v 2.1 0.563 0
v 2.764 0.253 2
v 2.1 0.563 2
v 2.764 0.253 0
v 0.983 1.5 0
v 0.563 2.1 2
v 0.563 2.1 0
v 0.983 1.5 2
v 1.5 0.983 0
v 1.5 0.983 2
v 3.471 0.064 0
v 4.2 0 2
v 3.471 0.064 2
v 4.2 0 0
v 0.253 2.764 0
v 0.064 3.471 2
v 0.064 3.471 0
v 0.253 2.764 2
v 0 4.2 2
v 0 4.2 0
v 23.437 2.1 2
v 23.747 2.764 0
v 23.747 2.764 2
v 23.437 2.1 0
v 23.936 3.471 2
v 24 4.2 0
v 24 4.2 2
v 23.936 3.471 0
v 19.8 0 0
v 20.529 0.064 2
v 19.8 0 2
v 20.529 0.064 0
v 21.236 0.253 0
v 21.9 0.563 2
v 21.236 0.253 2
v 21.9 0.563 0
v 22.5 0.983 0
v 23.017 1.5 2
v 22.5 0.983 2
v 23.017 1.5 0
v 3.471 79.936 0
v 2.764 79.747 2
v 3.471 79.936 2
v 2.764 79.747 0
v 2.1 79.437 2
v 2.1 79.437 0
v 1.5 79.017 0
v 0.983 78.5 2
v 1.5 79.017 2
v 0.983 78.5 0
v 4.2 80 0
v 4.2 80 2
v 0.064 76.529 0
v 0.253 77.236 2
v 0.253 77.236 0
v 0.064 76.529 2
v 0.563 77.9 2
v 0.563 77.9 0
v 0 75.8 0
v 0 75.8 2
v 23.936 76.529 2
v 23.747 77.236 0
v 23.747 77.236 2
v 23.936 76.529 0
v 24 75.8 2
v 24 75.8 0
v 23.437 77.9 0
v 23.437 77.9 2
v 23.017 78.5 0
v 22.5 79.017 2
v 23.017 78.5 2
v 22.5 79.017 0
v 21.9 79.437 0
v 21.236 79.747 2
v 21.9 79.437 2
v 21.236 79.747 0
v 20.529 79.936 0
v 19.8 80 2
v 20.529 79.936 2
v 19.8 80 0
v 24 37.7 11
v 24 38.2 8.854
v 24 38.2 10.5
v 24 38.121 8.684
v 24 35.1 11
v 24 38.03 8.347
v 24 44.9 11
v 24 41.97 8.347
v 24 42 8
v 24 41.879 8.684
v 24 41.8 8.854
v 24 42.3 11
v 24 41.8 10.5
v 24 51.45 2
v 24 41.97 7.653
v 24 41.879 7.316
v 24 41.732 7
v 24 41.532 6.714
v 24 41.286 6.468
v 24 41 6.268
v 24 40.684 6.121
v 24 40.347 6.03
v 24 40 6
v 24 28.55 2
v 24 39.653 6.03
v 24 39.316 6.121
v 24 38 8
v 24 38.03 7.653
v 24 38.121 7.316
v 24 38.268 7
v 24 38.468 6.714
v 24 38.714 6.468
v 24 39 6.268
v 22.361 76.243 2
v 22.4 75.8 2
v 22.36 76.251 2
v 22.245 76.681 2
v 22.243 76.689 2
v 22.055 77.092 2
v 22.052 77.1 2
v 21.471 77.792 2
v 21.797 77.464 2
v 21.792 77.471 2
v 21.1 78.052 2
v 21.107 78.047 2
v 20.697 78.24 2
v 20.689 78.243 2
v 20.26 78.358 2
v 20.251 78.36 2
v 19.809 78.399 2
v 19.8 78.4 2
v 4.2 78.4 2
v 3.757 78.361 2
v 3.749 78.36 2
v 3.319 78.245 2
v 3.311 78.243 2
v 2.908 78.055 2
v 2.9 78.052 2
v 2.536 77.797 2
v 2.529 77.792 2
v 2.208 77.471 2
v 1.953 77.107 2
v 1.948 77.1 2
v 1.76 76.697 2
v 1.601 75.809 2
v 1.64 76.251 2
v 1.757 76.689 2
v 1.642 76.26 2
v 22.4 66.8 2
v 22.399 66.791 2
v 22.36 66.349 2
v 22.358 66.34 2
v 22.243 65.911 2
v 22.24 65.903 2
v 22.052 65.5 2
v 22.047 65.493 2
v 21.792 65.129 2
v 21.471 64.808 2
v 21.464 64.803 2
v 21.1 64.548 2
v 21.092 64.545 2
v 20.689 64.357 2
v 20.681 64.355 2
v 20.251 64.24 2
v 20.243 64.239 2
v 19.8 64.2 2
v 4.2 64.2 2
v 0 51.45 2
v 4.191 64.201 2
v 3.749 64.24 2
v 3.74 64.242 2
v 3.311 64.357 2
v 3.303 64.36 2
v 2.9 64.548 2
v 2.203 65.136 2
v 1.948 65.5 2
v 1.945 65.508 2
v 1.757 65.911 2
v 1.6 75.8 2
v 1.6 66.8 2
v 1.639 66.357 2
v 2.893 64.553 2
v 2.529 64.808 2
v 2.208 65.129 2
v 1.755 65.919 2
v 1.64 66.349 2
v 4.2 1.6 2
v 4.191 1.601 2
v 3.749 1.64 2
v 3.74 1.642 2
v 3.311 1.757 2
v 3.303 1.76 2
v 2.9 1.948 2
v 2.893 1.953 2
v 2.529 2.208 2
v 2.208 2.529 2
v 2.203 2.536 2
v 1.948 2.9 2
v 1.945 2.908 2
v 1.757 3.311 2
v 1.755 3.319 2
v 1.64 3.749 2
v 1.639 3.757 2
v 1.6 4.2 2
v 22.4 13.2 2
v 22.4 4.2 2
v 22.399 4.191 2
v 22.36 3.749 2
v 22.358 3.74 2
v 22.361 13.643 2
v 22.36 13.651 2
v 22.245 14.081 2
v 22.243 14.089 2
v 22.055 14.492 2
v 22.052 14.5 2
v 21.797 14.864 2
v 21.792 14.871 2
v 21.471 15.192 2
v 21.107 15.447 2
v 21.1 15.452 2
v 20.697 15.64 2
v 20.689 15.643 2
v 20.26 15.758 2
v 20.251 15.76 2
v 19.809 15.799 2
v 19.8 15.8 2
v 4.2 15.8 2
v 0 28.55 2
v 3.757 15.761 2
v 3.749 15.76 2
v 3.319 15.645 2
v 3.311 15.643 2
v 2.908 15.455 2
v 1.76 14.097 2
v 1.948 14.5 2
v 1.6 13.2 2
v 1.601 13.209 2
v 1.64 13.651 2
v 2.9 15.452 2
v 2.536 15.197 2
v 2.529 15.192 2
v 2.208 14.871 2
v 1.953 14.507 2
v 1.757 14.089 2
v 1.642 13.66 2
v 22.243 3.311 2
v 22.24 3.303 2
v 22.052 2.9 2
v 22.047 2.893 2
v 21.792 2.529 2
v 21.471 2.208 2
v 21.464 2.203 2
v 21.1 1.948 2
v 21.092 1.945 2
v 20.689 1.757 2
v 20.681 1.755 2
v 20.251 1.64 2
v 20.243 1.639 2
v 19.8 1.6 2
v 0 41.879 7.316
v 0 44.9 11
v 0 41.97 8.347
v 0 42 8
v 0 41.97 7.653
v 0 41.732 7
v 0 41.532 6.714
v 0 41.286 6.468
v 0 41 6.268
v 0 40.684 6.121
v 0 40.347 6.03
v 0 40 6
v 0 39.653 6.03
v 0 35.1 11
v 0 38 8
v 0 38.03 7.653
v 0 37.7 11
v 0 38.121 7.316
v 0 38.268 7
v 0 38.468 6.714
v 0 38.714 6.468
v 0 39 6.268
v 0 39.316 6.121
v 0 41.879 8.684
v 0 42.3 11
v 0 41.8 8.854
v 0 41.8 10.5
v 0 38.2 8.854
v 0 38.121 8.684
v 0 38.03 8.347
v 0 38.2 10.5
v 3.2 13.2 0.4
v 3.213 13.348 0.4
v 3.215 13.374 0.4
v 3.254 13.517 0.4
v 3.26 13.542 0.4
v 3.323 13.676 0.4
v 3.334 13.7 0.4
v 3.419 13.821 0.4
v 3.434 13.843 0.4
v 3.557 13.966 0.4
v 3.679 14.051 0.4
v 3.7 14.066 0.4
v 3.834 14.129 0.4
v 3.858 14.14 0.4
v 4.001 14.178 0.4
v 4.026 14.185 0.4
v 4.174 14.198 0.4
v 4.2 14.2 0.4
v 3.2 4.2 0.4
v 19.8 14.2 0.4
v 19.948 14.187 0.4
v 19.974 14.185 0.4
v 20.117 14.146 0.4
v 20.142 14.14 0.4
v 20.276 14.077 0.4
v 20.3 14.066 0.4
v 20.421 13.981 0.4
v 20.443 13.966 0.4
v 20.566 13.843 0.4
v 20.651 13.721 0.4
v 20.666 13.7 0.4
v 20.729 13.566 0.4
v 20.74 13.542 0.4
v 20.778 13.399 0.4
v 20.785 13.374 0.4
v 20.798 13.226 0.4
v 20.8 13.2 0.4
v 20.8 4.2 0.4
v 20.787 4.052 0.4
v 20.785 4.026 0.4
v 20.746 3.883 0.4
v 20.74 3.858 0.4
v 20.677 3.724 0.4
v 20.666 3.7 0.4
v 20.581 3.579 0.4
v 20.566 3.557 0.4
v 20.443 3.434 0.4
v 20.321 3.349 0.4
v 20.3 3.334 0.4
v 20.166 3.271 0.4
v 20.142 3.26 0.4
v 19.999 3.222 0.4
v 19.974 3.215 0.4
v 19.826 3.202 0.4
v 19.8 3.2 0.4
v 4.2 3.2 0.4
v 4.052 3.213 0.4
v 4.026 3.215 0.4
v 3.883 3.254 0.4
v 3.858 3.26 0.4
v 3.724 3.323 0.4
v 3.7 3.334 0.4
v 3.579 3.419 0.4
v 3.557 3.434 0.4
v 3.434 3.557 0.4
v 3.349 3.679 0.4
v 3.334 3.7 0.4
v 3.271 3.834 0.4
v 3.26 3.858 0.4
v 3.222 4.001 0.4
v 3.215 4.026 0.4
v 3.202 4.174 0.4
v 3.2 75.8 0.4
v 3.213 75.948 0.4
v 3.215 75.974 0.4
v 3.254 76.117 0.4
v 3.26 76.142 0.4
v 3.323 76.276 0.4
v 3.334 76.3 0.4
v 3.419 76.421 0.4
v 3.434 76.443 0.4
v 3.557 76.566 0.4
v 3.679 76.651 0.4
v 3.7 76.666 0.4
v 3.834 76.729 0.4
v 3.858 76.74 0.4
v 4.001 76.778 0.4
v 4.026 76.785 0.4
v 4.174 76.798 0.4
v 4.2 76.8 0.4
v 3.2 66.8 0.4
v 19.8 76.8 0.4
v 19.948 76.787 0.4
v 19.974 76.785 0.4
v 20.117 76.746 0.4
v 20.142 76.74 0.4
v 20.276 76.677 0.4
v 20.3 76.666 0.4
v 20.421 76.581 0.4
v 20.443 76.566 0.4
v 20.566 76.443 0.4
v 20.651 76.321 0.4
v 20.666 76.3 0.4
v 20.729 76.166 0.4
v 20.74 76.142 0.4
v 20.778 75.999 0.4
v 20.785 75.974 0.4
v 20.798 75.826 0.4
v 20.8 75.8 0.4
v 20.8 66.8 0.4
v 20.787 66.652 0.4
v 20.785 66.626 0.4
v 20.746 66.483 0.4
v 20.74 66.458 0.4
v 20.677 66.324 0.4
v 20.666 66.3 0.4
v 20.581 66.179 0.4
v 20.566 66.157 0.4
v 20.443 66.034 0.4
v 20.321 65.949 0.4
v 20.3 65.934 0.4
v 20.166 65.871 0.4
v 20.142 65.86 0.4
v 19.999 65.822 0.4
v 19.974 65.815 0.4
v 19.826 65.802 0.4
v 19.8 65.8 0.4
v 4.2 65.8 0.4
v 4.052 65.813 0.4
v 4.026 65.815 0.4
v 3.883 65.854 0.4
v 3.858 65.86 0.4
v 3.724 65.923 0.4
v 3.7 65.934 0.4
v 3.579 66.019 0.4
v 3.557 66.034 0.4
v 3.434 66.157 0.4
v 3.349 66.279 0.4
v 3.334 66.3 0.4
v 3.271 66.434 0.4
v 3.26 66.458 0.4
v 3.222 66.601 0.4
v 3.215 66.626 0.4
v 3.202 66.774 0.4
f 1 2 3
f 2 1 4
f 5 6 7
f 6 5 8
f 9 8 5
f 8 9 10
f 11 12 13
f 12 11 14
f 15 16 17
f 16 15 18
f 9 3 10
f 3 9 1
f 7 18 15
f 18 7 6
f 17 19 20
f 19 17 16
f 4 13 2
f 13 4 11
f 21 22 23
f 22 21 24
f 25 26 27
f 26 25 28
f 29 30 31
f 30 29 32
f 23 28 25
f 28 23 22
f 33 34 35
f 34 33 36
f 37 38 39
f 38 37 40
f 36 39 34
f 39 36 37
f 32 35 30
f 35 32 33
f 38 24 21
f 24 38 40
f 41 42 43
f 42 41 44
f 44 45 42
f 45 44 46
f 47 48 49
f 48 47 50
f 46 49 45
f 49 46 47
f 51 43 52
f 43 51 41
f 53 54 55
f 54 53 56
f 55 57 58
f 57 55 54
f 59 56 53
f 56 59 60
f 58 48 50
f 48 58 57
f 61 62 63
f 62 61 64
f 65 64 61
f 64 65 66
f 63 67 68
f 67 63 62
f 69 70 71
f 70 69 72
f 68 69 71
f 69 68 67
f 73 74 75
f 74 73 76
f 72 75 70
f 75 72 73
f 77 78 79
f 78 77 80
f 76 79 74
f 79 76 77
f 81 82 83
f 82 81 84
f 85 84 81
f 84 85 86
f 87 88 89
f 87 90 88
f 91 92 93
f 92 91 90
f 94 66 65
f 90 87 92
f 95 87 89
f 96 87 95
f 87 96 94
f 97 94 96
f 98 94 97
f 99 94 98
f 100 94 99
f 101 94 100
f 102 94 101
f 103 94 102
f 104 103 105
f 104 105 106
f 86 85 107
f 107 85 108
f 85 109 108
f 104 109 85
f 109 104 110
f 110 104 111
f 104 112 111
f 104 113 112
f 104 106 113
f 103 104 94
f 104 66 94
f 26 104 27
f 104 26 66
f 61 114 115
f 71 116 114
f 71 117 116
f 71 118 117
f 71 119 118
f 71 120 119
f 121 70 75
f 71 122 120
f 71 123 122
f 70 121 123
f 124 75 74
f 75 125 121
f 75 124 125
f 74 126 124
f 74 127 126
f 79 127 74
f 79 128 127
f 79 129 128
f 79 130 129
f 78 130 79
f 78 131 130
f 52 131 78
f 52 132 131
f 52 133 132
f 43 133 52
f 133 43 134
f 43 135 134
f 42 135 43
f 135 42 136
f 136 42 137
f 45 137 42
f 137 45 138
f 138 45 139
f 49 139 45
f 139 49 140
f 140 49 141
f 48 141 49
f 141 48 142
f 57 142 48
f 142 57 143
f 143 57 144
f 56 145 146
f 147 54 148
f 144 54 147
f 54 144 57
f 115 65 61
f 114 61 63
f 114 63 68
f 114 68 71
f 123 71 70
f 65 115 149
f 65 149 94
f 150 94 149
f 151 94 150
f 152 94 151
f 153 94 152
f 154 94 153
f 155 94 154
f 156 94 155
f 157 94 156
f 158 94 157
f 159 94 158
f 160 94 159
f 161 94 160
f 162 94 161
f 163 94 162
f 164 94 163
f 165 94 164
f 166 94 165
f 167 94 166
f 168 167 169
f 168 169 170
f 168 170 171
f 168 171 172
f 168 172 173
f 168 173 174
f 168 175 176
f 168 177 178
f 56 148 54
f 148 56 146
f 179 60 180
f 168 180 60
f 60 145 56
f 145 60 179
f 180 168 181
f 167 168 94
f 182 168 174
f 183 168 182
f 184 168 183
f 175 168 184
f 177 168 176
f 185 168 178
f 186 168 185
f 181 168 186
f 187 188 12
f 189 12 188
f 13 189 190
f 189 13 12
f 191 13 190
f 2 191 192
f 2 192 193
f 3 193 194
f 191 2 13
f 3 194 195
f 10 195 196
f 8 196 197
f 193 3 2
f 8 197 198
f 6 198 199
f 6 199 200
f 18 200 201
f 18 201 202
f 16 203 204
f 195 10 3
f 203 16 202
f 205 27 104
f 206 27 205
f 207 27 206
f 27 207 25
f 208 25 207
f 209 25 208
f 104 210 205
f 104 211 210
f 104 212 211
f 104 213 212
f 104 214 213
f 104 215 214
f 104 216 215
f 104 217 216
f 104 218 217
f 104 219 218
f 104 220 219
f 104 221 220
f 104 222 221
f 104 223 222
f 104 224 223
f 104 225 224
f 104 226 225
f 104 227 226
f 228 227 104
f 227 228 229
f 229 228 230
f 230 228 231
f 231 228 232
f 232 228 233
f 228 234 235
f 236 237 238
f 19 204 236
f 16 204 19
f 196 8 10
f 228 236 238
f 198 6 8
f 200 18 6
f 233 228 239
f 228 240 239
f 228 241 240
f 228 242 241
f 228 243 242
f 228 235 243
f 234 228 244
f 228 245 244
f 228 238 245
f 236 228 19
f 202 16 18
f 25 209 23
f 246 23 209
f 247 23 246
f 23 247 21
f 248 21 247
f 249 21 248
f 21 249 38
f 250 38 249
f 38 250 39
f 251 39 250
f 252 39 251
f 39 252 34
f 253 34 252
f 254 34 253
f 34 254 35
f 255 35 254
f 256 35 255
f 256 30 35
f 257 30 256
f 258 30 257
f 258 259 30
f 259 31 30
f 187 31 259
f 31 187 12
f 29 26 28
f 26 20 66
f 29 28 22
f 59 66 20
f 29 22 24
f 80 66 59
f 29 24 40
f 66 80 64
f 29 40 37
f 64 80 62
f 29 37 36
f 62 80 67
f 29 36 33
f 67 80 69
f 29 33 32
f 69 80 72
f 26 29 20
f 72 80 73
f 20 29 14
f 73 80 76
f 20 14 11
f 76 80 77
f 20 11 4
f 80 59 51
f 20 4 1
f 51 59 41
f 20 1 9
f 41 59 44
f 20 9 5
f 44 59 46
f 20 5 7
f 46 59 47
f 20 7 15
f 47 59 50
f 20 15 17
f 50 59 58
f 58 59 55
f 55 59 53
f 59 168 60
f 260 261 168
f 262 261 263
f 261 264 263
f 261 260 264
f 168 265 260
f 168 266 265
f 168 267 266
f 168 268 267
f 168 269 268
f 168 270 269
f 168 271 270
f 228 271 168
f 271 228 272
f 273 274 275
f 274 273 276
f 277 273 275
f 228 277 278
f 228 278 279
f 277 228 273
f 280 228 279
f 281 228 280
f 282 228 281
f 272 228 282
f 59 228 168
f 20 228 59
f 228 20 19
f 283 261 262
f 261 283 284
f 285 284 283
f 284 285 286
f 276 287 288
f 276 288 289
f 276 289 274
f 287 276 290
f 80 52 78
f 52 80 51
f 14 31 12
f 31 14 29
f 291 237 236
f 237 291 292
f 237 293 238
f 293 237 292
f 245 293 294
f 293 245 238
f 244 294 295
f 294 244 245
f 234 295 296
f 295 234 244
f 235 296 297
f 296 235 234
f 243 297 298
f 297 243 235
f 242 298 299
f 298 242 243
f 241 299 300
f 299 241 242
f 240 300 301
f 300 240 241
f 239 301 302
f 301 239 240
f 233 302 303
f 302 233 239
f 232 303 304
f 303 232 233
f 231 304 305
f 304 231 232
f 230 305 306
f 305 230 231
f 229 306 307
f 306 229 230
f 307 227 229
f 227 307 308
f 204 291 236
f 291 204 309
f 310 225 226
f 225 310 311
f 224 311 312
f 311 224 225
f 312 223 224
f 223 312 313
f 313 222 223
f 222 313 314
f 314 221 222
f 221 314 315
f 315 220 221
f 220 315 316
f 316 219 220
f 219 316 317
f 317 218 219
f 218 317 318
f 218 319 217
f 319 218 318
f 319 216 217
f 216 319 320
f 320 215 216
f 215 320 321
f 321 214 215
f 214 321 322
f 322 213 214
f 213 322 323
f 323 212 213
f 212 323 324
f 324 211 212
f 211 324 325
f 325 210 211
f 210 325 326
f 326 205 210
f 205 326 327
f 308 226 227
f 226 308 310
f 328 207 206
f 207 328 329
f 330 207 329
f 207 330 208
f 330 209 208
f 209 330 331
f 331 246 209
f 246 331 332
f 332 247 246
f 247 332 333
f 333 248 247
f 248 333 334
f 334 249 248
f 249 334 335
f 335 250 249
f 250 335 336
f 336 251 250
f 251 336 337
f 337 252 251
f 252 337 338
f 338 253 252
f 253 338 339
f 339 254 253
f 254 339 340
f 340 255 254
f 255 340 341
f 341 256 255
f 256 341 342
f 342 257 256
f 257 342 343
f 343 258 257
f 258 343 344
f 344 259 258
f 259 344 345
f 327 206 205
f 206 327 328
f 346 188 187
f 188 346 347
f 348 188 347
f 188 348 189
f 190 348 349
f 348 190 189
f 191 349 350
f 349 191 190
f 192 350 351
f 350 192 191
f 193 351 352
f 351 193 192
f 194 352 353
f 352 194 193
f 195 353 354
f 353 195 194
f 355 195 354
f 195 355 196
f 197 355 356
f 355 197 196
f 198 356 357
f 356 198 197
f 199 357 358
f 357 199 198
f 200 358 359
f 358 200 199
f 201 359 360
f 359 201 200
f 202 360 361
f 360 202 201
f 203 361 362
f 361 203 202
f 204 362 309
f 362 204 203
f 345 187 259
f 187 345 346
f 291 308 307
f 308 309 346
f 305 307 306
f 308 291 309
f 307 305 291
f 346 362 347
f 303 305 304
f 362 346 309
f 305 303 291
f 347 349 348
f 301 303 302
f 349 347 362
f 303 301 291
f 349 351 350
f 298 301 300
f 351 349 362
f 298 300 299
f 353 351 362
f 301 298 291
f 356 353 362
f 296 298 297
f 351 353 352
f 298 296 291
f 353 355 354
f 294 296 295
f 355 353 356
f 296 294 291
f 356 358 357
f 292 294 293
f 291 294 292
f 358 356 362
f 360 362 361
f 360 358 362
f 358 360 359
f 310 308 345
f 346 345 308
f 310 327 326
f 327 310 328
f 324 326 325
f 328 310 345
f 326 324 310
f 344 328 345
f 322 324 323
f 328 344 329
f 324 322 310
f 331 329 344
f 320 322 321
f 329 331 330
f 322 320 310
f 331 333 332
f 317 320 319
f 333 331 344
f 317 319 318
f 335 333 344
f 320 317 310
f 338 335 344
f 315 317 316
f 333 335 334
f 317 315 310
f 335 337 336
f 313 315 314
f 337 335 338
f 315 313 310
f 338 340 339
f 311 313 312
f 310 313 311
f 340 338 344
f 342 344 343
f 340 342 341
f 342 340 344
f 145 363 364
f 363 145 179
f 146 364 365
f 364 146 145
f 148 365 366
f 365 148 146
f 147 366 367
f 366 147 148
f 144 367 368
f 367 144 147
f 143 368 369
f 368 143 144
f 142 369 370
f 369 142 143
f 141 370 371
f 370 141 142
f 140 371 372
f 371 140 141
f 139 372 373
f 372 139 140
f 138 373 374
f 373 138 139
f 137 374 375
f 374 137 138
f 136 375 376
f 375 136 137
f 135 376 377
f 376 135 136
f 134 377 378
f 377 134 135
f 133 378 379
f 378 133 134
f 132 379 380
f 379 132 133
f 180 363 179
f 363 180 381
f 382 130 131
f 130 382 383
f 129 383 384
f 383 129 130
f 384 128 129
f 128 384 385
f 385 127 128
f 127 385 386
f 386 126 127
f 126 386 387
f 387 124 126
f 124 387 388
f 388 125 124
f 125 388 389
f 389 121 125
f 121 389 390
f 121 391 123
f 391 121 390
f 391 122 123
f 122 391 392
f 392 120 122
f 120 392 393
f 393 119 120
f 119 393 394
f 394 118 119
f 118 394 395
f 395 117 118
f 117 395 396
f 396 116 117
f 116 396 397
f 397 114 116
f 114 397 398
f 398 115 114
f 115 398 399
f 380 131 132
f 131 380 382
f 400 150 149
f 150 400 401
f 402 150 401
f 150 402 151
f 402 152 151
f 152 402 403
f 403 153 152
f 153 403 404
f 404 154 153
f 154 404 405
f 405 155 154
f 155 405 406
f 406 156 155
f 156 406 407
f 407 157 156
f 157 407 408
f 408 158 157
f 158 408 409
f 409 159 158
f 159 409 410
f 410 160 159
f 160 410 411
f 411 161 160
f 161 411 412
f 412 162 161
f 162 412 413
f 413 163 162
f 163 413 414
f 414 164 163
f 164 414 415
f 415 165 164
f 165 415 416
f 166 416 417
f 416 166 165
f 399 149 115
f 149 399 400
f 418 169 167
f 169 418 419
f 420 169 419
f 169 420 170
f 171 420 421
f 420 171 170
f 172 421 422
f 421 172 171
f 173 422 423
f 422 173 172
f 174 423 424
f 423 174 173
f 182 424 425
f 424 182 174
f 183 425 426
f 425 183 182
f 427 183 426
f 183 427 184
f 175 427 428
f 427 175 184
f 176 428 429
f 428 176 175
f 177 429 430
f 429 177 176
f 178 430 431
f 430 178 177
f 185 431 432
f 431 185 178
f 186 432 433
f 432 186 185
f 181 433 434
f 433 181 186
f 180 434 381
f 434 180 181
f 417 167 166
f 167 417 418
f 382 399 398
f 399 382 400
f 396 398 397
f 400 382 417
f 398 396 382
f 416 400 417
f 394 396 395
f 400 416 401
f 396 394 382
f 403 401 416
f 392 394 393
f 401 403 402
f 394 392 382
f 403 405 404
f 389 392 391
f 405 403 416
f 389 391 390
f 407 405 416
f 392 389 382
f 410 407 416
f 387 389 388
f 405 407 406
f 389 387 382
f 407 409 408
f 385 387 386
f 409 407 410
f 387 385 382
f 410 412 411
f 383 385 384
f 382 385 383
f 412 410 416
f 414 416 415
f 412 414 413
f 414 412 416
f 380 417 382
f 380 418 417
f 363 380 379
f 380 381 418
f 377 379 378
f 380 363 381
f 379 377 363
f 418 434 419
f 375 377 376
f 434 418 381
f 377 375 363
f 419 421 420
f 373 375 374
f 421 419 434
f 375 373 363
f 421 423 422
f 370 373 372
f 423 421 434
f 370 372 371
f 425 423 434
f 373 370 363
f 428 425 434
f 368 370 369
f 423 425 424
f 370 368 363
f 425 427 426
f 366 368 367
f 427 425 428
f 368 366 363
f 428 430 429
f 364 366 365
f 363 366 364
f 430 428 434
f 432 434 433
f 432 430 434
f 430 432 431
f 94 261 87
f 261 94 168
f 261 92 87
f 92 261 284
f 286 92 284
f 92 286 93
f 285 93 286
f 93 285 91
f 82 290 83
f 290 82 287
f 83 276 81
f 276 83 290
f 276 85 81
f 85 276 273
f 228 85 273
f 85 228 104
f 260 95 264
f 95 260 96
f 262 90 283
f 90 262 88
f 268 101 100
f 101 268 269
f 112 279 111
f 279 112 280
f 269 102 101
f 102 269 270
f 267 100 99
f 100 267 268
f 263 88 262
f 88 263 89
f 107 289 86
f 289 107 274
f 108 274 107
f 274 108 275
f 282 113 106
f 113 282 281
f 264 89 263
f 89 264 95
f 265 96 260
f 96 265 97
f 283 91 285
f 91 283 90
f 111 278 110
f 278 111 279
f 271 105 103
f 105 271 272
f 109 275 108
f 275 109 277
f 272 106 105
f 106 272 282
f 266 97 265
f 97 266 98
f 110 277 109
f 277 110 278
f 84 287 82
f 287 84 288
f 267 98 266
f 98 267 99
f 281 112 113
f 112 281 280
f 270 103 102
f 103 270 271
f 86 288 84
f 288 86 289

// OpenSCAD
// preview[view:east, tilt:top diagonal]

/*[Parameters]*/

wire_diameter = 3.8;	//[2.0:2.0mm,2.1:2.1mm,2.2:2.2mm,2.3:2.3mm,2.4:2.4mm,2.5:2.5mm,2.6:2.6mm,2.7:2.7mm,2.8:2.8mm,2.9:2.9mm,3.0:3.0mm,3.1:3.1mm,3.2:3.2mm,3.3:3.3mm,3.4:3.4mm,3.5:3.5mm,3.6:3.6mm,3.7:3.7mm,3.8:3.8mm,3.9:3.9mm,4.0:4.0mm,4.1:4.1mm,4.2:4.2mm,4.3:4.3mm,4.4:4.4mm,4.5:4.5mm,4.6:4.6mm,4.7:4.7mm,4.8:4.8mm,4.9:4.9mm,5.0:5.0mm]
clearance = 0.1;	//[0.1:0.1mm,0.2:0.2mm,0.3:0.3mm,0.4:0.4mm]
panel_offset = 6;	//[3:3mm,4:4mm,5:5mm,6:6mm,7:7mm,8:8mm,9:9mm,10:10mm]
testprint = 0;	//[0:None,1:For Test Print]
quantity = 1;	//[1:1,2:2,3:3,4:4,5:5,6:6]

/*[Hidden]*/

module mesh_panel_wall_mount(wire_diameter,clearance,panel_offset,testprint,quantity)
{
	module rounded_cube(x,y,z,r,top_chamfer,bottom_chamfer) {
		difference(){
			cube([x,y,z]);
			if ( r > 0 ) {
				for ( tr=[[[-adj,-adj,-adj],[r,r,-adj]],[[x-r,-adj,-adj],[x-r,r,-adj]],[[-adj,y-r,-adj],[r,y-r,-adj]],[[x-r,y-r,-adj],[x-r,y-r,-adj]]] ) {
					difference(){
						translate(tr[0]) cube([r+adj,r+adj,z+adj*2]);
						translate(tr[1]) cylinder(r=r,h=z+adj*2,$fn=fn);
					}
				}
			}

			if ( top_chamfer > 0 ) {
				for ( tr=[[[0,r,0],[0,0,0],y],[[r,y,0],[0,0,-90],x],[[x,y-r,0],[0,0,-180],y],[[x-r,0,0],[0,0,-270],x]] ) {
					translate(tr[0]) {
						rotate(tr[1]) {
							translate([0,-adj,z]) {
								rotate([-90,0,0]) {
									linear_extrude(height=tr[2]-r*2+adj*2,center=false,convex=10) {
										polygon(points=[[-adj,-adj],[top_chamfer+adj,-adj],[-adj,top_chamfer+adj]]);
									}
								}
							}
							translate([r,tr[2]-r*2,z]) {
								intersection() {
									rotate_extrude($fn=fn) {
										translate([-r,0,0]) {
											polygon(points=[[-adj,adj],[top_chamfer+adj,adj],[-adj,-top_chamfer-adj]]);
										}
									};
									translate([-r-adj,0,-top_chamfer-adj]) {
										cube([r+adj,r+adj,top_chamfer+adj*2]);
									}
								}
							}
						}
					}
				}
			}


			if ( bottom_chamfer > 0 ) {
				for ( tr=[[[0,r,0],[0,0,0],y],[[r,y,0],[0,0,-90],x],[[x,y-r,0],[0,0,-180],y],[[x-r,0,0],[0,0,-270],x]] ) {
					translate(tr[0]) {
						rotate(tr[1]) {
							translate([0,-adj,0]) {
								rotate([-90,0,0]) {
									linear_extrude(height=tr[2]-r*2+adj*2,center=false,convex=10) {
										polygon(points=[[-adj,adj],[bottom_chamfer+adj,adj],[-adj,-bottom_chamfer-adj]]);
									}
								}
							}
							translate([r,tr[2]-r*2,0]) {
								intersection() {
									rotate_extrude($fn=fn) {
										translate([-r,0,0]) {
											polygon(points=[[-adj,-adj],[bottom_chamfer+adj,-adj],[-adj,bottom_chamfer+adj]]);
										}
									};
									translate([-r-adj,0,-adj]) {
										cube([r+adj,r+adj,bottom_chamfer+adj*2]);
									}
								}
							}
						}
					}
				}
			}


		}
	}

	fn=36;
	width=24;
	depth=80;
	height=2.0;
	staple_thickness=0.4;
	staple_width=11;
	bezel_width=3.2;
	outer_round=4.2;
	adj=0.1;

	offset=panel_offset-height;
	dia1=wire_diameter+clearance*2;	//3.8,0.1 -> 4.0  3.8,0.2 -> 4.2
	dia2=wire_diameter-0.4+clearance*2;	//3.8,0.1 -> 3.6  3.8,0.2 -> 3.8

	l1=1.0;
	l2=6.0+wire_diameter;
	slot_chamfer=0.5;

	mount_height=offset+dia1+l1;
	mount_width=mount_height*2+l2/2;

	for ( q = [0:quantity-1] ) {
		translate([q*(width+1.0),0,0]) {
			intersection() {
				union() {
					difference(){
						rounded_cube(width,depth,height,outer_round);

						translate([
							bezel_width-(height-staple_thickness)
							,bezel_width-(height-staple_thickness)
							,staple_thickness]
						)
							rounded_cube(
								width-bezel_width*2+(height-staple_thickness)*2
								,staple_width+(height-staple_thickness)*2
								,height-staple_thickness+adj
								,outer_round-bezel_width+(height-staple_thickness)
								,0
								,(height-staple_thickness)
							);

						translate([
							bezel_width-(height-staple_thickness)
							,depth-bezel_width-staple_width-(height-staple_thickness)
							,staple_thickness
						])
							rounded_cube(
								width-bezel_width*2+(height-staple_thickness)*2
								,staple_width+(height-staple_thickness)*2
								,height-staple_thickness+adj
								,outer_round-bezel_width+(height-staple_thickness)
								,0
								,(height-staple_thickness)
							);
					}

					translate([0,depth/2,height]) {
						rotate([90,0,90]) {
							difference() {
								linear_extrude(height=width,center=false,convex=10) {
									polygon(points=[
										[-mount_width/2,-adj]
										,[-mount_width/2,0]
										,[-l2/2,mount_height]
										,[-dia2/2-slot_chamfer,mount_height]
										,[-dia2/2,mount_height-slot_chamfer]
										,[-dia2/2,mount_height-l1-dia1/2]
										,[dia2/2,mount_height-l1-dia1/2]
										,[dia2/2,mount_height-slot_chamfer]
										,[dia2/2+slot_chamfer,mount_height]
										,[l2/2,mount_height]
										,[mount_width/2,0]
										,[mount_width/2,-adj]
									]);
								}
								translate([0,offset+dia1/2,-adj]) {
									cylinder(r=dia1/2,h=width+adj*2,$fn=fn);
								}

							}
						}
					}
				}

				if ( testprint==0 ) {
					translate([-adj,-adj,-adj])
						cube([width+adj*2,depth+adj*2,height+mount_height+adj*2]);
				} else {
					translate([-adj,mount_width/2,height+adj])
						cube([width+adj*2,depth-mount_width,mount_height+adj*2]);
				}
			}
		}
	}

}

mesh_panel_wall_mount(wire_diameter,clearance,panel_offset,testprint,quantity);

